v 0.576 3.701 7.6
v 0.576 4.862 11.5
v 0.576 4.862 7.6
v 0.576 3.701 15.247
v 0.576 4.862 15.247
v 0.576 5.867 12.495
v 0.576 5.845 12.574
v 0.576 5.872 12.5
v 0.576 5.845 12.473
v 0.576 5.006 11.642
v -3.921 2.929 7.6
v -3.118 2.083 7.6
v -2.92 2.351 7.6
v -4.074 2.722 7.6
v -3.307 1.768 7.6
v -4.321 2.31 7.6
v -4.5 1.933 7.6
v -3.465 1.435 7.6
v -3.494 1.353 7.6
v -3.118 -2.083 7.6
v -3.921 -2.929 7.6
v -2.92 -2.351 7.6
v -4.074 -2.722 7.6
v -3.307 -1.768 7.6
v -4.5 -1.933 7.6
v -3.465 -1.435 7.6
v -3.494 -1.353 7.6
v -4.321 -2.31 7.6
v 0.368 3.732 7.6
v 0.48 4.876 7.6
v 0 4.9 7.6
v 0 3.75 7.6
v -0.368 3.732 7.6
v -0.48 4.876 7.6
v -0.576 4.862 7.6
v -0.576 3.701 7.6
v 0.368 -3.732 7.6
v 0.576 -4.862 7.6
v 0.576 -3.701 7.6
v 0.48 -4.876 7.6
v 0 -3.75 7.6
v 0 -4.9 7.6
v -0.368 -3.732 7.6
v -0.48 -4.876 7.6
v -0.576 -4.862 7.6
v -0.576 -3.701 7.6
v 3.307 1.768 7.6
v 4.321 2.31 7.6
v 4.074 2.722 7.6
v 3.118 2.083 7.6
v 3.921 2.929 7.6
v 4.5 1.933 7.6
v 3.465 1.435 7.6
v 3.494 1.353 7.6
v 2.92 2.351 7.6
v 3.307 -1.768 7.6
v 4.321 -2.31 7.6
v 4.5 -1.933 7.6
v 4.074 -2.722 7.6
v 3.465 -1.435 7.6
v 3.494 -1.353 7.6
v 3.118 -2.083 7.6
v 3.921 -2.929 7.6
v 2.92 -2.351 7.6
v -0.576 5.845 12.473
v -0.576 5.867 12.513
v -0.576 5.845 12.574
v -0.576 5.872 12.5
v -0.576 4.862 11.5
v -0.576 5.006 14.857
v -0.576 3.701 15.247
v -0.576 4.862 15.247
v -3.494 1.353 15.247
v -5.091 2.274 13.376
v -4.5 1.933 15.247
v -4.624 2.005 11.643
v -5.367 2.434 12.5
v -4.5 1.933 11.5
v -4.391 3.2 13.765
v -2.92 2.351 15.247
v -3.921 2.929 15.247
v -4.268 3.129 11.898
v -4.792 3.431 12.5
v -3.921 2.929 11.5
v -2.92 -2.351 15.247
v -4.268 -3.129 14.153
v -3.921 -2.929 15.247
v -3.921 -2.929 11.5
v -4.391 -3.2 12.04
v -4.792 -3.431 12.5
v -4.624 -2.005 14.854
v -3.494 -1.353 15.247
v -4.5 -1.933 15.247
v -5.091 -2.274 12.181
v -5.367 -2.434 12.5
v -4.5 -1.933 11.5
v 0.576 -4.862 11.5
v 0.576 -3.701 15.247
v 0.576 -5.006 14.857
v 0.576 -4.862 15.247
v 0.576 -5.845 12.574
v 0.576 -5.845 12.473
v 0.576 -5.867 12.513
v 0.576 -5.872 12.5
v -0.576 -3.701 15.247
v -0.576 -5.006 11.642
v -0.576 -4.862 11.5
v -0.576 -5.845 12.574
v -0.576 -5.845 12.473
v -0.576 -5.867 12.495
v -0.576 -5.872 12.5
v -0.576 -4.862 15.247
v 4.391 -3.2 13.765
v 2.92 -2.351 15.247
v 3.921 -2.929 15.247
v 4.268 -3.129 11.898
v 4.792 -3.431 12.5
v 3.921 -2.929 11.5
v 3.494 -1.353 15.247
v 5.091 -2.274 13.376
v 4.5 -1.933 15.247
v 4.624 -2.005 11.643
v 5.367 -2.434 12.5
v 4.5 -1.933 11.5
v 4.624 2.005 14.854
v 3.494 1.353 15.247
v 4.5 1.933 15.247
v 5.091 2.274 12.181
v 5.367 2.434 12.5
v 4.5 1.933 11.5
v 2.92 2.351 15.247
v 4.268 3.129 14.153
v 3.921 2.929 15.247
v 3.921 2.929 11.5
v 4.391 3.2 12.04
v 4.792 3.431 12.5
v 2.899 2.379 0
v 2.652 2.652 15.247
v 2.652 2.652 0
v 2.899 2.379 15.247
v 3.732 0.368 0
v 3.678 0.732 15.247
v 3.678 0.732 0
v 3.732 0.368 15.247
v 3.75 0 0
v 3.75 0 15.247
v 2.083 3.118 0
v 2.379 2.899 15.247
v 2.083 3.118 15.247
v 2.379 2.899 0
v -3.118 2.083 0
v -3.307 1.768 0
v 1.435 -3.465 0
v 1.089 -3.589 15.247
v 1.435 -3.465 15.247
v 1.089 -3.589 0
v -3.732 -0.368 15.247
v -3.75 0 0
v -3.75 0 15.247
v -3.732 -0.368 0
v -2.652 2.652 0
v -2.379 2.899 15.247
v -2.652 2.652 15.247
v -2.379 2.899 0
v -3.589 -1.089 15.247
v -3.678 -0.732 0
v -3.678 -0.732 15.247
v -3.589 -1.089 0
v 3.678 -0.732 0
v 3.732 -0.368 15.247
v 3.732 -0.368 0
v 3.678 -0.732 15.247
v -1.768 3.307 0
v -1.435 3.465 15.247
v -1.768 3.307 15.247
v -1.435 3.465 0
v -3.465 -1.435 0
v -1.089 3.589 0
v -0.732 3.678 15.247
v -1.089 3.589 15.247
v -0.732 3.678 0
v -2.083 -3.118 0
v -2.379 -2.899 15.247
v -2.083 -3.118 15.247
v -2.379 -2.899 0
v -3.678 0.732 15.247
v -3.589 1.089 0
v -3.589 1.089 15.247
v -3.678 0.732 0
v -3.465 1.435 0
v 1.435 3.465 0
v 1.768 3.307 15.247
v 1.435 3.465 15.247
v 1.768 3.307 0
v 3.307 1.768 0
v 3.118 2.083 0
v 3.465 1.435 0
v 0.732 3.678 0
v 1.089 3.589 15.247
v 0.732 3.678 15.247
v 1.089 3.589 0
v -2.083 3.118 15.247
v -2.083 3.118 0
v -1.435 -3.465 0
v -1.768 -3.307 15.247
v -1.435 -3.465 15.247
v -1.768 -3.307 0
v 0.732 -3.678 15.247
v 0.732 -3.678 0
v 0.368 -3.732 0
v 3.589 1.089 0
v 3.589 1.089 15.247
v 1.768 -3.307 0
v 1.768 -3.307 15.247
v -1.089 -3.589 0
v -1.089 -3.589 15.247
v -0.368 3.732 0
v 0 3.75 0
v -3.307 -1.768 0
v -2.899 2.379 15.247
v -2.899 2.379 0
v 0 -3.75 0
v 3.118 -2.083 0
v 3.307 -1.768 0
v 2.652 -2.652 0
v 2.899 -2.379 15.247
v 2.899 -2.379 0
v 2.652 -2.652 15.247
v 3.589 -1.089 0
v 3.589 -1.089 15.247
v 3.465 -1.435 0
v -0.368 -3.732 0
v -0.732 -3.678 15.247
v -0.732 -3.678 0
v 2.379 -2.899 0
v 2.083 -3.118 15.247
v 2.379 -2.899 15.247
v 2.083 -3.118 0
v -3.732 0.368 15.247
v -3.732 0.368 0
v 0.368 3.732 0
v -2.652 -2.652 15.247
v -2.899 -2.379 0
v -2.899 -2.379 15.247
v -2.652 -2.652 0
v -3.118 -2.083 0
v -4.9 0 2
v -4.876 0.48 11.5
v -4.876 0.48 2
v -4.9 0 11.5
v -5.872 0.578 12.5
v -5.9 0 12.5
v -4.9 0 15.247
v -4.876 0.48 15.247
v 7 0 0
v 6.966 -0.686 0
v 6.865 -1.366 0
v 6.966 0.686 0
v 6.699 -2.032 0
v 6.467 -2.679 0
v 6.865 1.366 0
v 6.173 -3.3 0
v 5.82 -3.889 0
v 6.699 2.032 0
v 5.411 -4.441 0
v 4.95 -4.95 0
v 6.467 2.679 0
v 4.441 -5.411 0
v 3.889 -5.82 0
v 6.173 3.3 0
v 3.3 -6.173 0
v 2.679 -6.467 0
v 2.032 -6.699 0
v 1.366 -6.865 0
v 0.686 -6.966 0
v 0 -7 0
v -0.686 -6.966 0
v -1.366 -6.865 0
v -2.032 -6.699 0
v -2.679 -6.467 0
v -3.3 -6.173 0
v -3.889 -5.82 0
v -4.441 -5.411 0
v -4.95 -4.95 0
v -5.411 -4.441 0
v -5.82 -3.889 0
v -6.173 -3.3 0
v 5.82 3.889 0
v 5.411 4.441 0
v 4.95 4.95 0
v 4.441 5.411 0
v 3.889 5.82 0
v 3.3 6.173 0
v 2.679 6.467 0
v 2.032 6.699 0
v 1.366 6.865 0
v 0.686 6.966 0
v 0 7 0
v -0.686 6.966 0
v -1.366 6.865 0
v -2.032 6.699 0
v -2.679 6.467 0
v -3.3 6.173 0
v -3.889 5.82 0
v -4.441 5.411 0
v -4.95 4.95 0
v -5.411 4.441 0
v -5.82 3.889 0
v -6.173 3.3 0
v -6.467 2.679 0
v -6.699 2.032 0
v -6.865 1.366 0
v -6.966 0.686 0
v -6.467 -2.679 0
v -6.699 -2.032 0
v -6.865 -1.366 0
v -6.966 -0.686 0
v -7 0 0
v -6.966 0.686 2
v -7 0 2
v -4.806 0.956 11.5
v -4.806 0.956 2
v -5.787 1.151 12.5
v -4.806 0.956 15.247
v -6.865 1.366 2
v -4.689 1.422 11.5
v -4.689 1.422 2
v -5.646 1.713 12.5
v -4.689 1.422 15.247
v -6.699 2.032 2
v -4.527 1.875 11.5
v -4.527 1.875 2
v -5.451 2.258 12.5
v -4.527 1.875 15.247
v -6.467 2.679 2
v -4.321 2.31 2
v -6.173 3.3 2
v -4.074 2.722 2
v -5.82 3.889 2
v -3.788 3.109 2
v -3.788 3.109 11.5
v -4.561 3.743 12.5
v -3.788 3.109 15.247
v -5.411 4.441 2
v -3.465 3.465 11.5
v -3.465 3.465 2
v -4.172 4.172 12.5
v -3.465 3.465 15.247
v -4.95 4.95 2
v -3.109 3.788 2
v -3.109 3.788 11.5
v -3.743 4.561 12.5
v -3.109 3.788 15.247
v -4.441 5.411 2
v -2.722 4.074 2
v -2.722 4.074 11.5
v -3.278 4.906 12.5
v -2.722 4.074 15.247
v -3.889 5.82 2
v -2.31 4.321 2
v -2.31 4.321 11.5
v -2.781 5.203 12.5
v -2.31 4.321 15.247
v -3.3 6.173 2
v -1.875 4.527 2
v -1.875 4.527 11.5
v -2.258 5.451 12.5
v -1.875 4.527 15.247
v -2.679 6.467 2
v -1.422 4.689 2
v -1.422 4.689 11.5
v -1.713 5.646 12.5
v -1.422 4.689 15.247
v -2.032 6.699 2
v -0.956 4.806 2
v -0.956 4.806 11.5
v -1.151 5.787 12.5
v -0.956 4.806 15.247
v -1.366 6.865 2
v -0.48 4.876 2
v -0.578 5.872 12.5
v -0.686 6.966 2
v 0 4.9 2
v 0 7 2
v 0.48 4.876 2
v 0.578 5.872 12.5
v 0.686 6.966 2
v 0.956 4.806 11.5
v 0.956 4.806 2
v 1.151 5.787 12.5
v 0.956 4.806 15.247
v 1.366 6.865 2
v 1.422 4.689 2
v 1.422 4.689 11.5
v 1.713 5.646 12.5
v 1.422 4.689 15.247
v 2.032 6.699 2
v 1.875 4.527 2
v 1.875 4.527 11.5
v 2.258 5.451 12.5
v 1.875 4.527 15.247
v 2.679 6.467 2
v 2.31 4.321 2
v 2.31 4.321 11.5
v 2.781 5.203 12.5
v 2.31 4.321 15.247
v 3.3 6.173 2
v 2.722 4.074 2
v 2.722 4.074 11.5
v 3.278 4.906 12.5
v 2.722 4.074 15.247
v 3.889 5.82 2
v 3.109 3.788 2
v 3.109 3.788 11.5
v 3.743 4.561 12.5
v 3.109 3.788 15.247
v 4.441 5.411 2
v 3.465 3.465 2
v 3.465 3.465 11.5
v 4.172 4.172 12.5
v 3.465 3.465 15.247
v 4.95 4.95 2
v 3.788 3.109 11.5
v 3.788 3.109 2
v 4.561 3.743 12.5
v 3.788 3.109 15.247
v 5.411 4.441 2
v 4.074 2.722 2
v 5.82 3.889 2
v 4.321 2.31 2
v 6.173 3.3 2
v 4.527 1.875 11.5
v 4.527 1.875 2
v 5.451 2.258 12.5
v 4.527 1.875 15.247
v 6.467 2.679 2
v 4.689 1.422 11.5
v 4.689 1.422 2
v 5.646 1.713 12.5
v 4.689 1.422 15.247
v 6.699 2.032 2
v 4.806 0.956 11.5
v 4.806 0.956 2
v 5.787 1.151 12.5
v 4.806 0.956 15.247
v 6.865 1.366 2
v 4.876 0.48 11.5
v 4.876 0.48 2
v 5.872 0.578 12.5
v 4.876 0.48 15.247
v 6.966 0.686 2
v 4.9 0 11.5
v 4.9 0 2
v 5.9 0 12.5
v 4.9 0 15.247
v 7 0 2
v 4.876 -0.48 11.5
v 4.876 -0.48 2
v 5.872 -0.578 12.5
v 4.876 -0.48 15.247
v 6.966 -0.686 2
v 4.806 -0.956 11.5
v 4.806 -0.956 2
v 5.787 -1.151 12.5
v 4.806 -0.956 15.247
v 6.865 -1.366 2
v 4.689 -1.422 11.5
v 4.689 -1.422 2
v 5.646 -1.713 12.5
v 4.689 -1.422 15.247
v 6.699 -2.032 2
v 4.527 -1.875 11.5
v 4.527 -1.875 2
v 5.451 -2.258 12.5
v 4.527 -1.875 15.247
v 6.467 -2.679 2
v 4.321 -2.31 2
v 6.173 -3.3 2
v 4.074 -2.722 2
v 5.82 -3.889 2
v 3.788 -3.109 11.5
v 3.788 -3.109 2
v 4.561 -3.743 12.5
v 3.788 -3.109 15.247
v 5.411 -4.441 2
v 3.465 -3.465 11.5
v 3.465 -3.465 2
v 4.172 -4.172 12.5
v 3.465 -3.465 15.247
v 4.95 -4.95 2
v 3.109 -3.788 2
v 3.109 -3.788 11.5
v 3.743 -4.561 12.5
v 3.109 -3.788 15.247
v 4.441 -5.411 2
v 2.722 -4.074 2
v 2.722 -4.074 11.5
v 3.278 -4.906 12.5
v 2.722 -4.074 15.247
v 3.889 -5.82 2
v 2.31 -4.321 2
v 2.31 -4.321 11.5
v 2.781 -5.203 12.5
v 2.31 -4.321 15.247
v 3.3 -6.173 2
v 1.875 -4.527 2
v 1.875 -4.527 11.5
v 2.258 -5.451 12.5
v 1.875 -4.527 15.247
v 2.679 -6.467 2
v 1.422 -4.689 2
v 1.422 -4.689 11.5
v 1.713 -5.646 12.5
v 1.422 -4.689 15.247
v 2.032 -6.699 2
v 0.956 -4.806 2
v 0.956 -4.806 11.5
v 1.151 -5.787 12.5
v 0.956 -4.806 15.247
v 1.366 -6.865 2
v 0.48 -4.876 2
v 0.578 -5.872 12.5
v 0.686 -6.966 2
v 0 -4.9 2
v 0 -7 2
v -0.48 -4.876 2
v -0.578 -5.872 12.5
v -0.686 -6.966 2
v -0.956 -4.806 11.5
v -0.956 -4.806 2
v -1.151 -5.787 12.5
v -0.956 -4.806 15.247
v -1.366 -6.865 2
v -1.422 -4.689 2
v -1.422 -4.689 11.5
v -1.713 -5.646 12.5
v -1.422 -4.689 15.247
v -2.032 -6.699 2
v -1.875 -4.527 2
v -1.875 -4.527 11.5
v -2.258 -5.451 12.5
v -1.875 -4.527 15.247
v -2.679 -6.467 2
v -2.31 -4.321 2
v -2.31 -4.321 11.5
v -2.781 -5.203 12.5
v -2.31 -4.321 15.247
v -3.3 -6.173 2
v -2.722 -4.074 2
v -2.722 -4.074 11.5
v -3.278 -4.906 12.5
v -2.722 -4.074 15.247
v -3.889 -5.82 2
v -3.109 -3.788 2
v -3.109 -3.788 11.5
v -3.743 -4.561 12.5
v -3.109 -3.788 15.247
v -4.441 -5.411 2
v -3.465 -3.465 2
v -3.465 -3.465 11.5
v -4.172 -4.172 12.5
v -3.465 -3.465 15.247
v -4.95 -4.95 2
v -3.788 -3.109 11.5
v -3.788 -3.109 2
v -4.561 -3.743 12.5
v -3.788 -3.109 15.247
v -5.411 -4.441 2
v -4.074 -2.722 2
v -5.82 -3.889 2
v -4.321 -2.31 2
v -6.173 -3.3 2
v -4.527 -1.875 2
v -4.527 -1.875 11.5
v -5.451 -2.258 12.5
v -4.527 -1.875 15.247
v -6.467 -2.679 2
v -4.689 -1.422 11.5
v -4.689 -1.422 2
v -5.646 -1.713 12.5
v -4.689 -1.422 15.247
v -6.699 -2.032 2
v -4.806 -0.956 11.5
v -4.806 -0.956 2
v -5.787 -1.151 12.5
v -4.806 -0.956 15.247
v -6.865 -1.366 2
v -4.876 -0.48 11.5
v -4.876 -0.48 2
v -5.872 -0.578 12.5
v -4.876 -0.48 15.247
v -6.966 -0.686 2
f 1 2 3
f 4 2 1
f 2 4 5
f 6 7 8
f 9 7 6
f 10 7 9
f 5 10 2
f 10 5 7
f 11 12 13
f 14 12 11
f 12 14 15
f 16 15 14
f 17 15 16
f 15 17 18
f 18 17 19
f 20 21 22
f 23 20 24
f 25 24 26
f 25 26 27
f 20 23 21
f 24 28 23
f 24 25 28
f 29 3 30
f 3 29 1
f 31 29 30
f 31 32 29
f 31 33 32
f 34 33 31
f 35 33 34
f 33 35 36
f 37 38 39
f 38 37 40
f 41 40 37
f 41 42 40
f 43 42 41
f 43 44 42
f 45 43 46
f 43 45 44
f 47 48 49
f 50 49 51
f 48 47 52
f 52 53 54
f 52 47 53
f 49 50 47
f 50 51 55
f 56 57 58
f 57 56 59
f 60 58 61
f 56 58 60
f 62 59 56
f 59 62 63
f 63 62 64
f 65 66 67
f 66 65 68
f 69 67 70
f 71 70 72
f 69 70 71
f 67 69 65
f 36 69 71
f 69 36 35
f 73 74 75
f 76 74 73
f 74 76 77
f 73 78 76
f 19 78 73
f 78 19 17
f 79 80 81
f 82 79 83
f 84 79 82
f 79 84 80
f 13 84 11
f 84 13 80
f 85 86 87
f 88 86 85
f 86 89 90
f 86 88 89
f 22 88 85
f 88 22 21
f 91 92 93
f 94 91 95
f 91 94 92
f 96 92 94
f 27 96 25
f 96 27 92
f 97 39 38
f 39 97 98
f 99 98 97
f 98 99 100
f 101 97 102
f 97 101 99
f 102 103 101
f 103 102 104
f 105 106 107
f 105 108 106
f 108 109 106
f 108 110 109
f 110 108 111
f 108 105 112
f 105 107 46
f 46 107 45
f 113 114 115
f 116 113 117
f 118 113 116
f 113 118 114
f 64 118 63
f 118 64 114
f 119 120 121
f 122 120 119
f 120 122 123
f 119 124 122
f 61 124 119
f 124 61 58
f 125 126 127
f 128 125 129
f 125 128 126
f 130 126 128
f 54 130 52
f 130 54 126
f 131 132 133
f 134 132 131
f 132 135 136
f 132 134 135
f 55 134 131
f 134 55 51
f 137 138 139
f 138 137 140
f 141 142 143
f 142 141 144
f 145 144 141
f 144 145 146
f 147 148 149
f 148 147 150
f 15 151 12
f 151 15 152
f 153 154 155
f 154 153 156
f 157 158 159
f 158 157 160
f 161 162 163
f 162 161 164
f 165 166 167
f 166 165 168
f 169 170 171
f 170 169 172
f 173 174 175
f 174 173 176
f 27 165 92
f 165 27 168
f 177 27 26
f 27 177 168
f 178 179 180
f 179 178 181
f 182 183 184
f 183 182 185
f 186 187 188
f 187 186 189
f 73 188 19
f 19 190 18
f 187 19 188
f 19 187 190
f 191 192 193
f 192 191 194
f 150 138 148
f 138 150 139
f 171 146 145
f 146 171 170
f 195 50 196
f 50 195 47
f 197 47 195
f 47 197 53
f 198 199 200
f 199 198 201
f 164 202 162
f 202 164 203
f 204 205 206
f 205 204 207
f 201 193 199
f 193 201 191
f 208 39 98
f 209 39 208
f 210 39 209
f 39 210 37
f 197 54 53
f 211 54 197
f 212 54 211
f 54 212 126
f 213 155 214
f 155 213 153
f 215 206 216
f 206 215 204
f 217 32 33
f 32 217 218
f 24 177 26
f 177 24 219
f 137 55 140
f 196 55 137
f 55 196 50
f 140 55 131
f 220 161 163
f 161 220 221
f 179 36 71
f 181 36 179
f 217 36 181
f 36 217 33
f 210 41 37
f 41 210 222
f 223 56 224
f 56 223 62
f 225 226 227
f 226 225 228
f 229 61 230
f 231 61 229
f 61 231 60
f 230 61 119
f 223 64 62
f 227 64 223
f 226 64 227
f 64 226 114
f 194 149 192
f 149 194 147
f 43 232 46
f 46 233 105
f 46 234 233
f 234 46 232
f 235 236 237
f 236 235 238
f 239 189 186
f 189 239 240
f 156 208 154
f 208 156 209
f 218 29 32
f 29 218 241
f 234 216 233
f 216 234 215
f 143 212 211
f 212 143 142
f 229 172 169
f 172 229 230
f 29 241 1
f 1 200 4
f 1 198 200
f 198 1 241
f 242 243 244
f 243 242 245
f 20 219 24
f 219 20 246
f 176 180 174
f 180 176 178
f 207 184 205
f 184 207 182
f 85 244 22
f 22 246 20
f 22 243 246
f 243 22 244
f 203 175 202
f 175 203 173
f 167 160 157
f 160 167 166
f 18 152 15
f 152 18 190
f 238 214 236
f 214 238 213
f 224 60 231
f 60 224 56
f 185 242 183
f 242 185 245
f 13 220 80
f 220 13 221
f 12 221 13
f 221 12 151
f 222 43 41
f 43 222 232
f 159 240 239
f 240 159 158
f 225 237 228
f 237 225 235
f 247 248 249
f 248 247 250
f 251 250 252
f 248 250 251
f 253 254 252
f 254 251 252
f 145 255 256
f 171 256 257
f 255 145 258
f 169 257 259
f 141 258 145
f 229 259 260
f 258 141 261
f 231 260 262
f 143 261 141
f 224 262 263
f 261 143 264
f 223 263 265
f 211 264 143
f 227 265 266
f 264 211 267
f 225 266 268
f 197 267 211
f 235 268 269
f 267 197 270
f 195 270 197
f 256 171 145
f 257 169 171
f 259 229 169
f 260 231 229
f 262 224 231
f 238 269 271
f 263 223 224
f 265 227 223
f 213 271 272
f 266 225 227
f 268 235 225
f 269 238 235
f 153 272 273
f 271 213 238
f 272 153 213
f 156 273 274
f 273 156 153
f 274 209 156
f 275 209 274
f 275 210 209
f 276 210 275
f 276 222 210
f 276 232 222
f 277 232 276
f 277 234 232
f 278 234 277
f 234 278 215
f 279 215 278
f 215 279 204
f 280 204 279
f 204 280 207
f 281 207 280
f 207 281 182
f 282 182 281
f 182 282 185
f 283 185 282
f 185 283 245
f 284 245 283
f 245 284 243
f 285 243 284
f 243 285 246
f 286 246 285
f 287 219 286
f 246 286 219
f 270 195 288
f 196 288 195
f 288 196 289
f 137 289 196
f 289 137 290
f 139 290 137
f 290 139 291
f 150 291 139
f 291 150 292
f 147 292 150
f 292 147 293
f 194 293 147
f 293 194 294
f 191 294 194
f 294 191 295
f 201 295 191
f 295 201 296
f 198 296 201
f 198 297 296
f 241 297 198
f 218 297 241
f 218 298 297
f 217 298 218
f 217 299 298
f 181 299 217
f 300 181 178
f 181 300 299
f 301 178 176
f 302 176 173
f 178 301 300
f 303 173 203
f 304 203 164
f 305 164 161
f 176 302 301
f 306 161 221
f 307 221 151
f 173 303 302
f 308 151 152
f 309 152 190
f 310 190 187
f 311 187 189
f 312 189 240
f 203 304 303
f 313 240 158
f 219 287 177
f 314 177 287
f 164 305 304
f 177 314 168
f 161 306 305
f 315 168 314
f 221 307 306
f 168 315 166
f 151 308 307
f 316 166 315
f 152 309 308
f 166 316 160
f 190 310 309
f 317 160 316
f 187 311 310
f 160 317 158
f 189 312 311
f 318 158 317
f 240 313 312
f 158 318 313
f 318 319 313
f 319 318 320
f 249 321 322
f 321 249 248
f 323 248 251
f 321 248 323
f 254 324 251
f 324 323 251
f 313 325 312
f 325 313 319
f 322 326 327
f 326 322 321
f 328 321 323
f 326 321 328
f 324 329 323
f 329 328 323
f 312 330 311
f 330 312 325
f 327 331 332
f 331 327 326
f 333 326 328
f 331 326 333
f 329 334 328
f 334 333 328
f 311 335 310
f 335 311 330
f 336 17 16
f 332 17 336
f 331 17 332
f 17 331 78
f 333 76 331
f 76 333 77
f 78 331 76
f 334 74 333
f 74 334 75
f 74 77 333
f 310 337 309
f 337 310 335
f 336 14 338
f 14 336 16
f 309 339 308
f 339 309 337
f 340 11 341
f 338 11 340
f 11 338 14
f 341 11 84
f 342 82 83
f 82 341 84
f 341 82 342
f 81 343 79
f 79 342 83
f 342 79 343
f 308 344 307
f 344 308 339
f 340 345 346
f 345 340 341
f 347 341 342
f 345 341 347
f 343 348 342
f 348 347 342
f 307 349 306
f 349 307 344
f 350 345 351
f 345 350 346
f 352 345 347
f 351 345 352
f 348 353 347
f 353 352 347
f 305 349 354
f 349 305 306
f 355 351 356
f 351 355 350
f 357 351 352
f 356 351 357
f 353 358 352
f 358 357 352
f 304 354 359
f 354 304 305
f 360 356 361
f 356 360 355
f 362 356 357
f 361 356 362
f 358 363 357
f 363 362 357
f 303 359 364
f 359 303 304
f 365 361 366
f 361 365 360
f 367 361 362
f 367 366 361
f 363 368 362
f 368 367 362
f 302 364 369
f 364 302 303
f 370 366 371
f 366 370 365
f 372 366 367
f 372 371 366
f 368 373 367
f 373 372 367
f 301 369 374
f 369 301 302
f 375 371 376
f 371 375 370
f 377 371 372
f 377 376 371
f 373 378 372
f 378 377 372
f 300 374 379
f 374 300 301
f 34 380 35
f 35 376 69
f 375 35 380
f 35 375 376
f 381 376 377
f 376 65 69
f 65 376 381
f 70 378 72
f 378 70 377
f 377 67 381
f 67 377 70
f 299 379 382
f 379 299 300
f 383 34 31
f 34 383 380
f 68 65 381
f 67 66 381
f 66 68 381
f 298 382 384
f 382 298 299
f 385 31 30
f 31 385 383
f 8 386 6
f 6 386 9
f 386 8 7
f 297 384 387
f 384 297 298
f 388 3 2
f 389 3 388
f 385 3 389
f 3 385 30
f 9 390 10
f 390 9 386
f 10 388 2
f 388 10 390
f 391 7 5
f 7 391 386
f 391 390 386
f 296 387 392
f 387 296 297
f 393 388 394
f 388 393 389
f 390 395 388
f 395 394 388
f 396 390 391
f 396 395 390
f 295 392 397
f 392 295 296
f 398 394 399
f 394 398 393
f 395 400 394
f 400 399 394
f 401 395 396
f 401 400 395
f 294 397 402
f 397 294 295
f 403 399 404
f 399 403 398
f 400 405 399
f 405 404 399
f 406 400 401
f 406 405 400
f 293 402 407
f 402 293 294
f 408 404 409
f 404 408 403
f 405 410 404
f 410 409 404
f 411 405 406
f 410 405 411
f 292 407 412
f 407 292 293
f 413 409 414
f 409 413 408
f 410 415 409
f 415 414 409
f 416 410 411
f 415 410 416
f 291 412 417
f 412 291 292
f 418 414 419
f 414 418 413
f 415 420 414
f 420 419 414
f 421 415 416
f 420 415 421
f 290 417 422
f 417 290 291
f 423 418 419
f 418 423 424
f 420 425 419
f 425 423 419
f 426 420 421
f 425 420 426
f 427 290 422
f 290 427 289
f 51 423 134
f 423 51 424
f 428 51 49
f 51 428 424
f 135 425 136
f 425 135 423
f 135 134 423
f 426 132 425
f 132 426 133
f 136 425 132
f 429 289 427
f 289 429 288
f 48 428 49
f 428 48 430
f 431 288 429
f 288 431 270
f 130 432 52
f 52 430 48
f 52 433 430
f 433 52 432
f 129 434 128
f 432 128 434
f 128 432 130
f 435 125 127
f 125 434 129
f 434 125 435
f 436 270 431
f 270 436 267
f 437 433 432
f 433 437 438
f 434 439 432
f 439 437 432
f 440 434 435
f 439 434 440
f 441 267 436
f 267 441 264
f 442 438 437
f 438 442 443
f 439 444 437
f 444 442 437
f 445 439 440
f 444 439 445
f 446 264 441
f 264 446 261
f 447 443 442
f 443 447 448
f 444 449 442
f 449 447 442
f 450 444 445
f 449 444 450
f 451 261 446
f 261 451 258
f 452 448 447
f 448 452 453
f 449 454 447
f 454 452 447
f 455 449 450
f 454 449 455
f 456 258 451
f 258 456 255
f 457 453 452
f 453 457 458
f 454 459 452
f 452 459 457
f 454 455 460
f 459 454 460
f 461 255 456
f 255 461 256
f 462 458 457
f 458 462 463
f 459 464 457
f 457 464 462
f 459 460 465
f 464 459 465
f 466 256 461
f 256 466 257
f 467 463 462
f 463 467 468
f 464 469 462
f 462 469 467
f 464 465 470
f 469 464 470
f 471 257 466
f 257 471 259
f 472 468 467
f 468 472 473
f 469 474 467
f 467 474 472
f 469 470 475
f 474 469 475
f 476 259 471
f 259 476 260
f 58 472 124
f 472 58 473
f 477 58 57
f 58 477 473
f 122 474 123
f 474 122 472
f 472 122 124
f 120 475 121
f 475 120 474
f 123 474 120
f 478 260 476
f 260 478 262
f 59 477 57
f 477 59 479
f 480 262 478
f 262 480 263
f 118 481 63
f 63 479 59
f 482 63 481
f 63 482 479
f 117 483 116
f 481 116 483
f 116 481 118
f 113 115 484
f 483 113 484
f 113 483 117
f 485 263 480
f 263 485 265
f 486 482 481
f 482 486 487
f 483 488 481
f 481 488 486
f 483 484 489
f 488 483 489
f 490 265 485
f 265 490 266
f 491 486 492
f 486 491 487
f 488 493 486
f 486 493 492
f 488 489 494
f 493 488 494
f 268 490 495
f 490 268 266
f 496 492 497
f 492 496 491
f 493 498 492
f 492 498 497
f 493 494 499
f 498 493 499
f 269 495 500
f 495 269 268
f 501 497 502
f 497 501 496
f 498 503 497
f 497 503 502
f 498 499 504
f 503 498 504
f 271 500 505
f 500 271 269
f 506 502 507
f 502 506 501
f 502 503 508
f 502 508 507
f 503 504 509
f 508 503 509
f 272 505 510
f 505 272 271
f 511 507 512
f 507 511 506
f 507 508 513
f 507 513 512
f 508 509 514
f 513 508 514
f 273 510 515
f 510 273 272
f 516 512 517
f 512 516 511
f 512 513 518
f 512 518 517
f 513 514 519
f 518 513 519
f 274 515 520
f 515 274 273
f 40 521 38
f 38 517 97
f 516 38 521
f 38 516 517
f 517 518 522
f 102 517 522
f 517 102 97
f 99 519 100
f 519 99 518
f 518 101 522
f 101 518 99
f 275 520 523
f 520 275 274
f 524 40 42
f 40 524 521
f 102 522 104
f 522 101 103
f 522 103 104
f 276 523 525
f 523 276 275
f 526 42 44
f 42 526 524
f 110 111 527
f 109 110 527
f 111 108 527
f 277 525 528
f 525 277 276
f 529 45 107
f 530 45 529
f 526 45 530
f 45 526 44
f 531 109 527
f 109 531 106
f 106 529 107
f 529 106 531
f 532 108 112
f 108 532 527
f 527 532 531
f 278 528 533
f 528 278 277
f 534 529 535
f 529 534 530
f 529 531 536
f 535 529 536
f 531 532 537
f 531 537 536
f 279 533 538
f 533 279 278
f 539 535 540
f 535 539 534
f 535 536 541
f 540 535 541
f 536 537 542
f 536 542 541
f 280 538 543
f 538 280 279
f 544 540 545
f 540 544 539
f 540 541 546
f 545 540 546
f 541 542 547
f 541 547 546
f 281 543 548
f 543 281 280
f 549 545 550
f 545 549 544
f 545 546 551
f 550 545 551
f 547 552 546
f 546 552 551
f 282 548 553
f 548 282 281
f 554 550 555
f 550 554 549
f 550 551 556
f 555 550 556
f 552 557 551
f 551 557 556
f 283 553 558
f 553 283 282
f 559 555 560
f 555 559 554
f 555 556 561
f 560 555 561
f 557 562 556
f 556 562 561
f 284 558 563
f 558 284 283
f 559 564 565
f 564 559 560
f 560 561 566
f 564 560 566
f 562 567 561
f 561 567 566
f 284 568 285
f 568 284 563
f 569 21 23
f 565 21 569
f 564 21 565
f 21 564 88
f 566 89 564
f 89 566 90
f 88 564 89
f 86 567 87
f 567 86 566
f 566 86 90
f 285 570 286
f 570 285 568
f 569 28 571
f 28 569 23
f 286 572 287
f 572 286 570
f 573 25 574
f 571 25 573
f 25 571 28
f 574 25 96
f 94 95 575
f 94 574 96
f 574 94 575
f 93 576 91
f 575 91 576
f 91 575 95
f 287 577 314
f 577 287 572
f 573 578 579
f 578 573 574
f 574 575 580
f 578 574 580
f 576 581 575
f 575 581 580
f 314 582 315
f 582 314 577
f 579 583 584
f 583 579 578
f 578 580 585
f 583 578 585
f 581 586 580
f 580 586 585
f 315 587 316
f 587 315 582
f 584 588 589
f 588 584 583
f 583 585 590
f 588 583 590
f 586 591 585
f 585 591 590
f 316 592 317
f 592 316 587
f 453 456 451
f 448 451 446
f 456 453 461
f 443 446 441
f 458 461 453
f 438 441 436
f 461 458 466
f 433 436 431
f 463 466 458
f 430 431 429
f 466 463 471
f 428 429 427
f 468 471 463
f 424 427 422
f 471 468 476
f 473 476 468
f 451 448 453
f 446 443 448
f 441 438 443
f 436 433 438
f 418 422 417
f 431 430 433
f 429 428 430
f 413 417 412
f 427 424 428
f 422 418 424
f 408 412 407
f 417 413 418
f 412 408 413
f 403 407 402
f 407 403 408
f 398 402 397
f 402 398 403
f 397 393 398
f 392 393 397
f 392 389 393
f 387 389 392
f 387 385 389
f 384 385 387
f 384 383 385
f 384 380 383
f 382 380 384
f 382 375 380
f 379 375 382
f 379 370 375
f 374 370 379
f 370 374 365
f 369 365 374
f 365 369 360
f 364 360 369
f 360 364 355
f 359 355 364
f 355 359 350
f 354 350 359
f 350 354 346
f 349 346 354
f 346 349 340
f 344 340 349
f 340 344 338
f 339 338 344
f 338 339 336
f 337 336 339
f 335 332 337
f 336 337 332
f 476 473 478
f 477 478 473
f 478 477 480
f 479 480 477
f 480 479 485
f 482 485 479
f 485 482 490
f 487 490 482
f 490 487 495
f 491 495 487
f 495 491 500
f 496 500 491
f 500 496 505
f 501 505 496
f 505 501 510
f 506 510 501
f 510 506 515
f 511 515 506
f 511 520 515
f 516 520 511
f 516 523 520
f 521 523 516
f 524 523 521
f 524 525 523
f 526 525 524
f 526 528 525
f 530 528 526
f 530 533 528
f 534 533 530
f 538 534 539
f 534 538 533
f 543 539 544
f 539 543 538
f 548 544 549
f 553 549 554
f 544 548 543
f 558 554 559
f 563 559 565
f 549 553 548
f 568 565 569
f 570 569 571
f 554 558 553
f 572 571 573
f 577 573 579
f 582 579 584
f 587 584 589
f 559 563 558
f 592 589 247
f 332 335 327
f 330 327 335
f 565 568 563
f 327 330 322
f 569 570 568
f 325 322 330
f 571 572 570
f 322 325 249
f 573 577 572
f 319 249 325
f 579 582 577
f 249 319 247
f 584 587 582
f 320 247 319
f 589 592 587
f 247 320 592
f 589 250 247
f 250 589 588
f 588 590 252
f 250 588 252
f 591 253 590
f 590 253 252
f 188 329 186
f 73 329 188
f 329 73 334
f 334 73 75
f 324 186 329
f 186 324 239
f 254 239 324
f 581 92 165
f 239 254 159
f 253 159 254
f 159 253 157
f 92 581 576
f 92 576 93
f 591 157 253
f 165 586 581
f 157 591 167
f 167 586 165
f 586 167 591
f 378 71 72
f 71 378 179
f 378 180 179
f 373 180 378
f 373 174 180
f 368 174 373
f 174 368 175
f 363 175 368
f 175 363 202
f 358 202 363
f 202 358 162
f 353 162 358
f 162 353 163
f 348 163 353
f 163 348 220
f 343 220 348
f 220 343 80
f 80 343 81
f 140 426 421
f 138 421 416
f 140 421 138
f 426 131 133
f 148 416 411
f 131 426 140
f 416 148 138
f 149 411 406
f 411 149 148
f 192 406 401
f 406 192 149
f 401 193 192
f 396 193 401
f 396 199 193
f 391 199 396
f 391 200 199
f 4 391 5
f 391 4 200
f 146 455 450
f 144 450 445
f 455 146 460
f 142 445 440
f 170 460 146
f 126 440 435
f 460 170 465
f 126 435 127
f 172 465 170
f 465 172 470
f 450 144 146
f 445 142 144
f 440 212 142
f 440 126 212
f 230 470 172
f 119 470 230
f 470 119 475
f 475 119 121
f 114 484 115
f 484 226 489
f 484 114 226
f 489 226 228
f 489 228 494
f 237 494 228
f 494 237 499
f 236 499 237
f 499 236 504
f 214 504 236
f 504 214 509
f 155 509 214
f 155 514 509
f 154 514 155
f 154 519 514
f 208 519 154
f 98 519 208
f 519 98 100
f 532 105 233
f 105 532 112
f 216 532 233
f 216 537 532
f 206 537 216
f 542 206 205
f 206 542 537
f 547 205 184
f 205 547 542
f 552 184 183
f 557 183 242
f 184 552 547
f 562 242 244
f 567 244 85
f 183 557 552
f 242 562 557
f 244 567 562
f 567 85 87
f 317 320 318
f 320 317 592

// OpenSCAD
// Customizable cable grommet
// by Frederic RIBLE F1OAT / 2018/11/09

// (in mm)
cable_diameter = 7.5;

// (in mm)
hole_diameter = 9.8;

// (in mm)
hole_depth = 9.5;

// (in mm)
shoulder_diameter = 14;

// (in mm)
shoulder_thickness = 2;

// (in mm)
cone_thickness = 1;

// (in degree)
cone_angle = 20;

// (in mm)
flex_thickness = 1;
    
// Following variables are not parameters
epsilon = 0.1+0;
$fn=64.0;

cable_radius = cable_diameter/2;
hole_radius = hole_diameter/2;
shoulder_radius = shoulder_diameter/2;
cone_radius = hole_radius+cone_thickness;
cone_length = cone_thickness/tan(cone_angle);

total_length = shoulder_thickness+hole_depth+cone_thickness+cone_length;
   
profile = [[0, 0],
           [0, total_length], 
           [hole_radius, total_length],
           [hole_radius+cone_thickness, shoulder_thickness+hole_depth+cone_thickness],
           [hole_radius, shoulder_thickness+hole_depth],
           [hole_radius, shoulder_thickness],
           [shoulder_radius, shoulder_thickness],
           [shoulder_radius, 0],
           [0, 0]
          ];
          
module base() {
    rotate_extrude()
        polygon(points=profile, convexity = 10);
}

module cut() {
    nb_gaps = 6;
    gap = (cone_radius-hole_radius)*6.28/nb_gaps * 1.1;
    gap_length = cone_length + 5*cone_thickness;
    
    union() {
        for (c=[0:nb_gaps-1]) 
            rotate([0, 0, 360/nb_gaps*c])
                translate([-gap/2, 0, total_length - gap_length+epsilon])
                    cube([gap, hole_radius+cone_thickness+epsilon, gap_length]);
        r2 = 2;
        r1 = hole_radius - flex_thickness - r2;

        if (r1 > r2) {
            translate([0, 0, total_length - gap_length+r2/2])
                torus(r1, r2);
        }
        
        translate([0, 0, -epsilon])
            cylinder(h=total_length+2*epsilon, r=cable_radius);
    }
}

module torus(r1, r2) {
    rotate_extrude(convexity = 10)
        translate([r1, 0, 0])
            circle(r = r2);
}
difference() {
    base();
    cut();
}
